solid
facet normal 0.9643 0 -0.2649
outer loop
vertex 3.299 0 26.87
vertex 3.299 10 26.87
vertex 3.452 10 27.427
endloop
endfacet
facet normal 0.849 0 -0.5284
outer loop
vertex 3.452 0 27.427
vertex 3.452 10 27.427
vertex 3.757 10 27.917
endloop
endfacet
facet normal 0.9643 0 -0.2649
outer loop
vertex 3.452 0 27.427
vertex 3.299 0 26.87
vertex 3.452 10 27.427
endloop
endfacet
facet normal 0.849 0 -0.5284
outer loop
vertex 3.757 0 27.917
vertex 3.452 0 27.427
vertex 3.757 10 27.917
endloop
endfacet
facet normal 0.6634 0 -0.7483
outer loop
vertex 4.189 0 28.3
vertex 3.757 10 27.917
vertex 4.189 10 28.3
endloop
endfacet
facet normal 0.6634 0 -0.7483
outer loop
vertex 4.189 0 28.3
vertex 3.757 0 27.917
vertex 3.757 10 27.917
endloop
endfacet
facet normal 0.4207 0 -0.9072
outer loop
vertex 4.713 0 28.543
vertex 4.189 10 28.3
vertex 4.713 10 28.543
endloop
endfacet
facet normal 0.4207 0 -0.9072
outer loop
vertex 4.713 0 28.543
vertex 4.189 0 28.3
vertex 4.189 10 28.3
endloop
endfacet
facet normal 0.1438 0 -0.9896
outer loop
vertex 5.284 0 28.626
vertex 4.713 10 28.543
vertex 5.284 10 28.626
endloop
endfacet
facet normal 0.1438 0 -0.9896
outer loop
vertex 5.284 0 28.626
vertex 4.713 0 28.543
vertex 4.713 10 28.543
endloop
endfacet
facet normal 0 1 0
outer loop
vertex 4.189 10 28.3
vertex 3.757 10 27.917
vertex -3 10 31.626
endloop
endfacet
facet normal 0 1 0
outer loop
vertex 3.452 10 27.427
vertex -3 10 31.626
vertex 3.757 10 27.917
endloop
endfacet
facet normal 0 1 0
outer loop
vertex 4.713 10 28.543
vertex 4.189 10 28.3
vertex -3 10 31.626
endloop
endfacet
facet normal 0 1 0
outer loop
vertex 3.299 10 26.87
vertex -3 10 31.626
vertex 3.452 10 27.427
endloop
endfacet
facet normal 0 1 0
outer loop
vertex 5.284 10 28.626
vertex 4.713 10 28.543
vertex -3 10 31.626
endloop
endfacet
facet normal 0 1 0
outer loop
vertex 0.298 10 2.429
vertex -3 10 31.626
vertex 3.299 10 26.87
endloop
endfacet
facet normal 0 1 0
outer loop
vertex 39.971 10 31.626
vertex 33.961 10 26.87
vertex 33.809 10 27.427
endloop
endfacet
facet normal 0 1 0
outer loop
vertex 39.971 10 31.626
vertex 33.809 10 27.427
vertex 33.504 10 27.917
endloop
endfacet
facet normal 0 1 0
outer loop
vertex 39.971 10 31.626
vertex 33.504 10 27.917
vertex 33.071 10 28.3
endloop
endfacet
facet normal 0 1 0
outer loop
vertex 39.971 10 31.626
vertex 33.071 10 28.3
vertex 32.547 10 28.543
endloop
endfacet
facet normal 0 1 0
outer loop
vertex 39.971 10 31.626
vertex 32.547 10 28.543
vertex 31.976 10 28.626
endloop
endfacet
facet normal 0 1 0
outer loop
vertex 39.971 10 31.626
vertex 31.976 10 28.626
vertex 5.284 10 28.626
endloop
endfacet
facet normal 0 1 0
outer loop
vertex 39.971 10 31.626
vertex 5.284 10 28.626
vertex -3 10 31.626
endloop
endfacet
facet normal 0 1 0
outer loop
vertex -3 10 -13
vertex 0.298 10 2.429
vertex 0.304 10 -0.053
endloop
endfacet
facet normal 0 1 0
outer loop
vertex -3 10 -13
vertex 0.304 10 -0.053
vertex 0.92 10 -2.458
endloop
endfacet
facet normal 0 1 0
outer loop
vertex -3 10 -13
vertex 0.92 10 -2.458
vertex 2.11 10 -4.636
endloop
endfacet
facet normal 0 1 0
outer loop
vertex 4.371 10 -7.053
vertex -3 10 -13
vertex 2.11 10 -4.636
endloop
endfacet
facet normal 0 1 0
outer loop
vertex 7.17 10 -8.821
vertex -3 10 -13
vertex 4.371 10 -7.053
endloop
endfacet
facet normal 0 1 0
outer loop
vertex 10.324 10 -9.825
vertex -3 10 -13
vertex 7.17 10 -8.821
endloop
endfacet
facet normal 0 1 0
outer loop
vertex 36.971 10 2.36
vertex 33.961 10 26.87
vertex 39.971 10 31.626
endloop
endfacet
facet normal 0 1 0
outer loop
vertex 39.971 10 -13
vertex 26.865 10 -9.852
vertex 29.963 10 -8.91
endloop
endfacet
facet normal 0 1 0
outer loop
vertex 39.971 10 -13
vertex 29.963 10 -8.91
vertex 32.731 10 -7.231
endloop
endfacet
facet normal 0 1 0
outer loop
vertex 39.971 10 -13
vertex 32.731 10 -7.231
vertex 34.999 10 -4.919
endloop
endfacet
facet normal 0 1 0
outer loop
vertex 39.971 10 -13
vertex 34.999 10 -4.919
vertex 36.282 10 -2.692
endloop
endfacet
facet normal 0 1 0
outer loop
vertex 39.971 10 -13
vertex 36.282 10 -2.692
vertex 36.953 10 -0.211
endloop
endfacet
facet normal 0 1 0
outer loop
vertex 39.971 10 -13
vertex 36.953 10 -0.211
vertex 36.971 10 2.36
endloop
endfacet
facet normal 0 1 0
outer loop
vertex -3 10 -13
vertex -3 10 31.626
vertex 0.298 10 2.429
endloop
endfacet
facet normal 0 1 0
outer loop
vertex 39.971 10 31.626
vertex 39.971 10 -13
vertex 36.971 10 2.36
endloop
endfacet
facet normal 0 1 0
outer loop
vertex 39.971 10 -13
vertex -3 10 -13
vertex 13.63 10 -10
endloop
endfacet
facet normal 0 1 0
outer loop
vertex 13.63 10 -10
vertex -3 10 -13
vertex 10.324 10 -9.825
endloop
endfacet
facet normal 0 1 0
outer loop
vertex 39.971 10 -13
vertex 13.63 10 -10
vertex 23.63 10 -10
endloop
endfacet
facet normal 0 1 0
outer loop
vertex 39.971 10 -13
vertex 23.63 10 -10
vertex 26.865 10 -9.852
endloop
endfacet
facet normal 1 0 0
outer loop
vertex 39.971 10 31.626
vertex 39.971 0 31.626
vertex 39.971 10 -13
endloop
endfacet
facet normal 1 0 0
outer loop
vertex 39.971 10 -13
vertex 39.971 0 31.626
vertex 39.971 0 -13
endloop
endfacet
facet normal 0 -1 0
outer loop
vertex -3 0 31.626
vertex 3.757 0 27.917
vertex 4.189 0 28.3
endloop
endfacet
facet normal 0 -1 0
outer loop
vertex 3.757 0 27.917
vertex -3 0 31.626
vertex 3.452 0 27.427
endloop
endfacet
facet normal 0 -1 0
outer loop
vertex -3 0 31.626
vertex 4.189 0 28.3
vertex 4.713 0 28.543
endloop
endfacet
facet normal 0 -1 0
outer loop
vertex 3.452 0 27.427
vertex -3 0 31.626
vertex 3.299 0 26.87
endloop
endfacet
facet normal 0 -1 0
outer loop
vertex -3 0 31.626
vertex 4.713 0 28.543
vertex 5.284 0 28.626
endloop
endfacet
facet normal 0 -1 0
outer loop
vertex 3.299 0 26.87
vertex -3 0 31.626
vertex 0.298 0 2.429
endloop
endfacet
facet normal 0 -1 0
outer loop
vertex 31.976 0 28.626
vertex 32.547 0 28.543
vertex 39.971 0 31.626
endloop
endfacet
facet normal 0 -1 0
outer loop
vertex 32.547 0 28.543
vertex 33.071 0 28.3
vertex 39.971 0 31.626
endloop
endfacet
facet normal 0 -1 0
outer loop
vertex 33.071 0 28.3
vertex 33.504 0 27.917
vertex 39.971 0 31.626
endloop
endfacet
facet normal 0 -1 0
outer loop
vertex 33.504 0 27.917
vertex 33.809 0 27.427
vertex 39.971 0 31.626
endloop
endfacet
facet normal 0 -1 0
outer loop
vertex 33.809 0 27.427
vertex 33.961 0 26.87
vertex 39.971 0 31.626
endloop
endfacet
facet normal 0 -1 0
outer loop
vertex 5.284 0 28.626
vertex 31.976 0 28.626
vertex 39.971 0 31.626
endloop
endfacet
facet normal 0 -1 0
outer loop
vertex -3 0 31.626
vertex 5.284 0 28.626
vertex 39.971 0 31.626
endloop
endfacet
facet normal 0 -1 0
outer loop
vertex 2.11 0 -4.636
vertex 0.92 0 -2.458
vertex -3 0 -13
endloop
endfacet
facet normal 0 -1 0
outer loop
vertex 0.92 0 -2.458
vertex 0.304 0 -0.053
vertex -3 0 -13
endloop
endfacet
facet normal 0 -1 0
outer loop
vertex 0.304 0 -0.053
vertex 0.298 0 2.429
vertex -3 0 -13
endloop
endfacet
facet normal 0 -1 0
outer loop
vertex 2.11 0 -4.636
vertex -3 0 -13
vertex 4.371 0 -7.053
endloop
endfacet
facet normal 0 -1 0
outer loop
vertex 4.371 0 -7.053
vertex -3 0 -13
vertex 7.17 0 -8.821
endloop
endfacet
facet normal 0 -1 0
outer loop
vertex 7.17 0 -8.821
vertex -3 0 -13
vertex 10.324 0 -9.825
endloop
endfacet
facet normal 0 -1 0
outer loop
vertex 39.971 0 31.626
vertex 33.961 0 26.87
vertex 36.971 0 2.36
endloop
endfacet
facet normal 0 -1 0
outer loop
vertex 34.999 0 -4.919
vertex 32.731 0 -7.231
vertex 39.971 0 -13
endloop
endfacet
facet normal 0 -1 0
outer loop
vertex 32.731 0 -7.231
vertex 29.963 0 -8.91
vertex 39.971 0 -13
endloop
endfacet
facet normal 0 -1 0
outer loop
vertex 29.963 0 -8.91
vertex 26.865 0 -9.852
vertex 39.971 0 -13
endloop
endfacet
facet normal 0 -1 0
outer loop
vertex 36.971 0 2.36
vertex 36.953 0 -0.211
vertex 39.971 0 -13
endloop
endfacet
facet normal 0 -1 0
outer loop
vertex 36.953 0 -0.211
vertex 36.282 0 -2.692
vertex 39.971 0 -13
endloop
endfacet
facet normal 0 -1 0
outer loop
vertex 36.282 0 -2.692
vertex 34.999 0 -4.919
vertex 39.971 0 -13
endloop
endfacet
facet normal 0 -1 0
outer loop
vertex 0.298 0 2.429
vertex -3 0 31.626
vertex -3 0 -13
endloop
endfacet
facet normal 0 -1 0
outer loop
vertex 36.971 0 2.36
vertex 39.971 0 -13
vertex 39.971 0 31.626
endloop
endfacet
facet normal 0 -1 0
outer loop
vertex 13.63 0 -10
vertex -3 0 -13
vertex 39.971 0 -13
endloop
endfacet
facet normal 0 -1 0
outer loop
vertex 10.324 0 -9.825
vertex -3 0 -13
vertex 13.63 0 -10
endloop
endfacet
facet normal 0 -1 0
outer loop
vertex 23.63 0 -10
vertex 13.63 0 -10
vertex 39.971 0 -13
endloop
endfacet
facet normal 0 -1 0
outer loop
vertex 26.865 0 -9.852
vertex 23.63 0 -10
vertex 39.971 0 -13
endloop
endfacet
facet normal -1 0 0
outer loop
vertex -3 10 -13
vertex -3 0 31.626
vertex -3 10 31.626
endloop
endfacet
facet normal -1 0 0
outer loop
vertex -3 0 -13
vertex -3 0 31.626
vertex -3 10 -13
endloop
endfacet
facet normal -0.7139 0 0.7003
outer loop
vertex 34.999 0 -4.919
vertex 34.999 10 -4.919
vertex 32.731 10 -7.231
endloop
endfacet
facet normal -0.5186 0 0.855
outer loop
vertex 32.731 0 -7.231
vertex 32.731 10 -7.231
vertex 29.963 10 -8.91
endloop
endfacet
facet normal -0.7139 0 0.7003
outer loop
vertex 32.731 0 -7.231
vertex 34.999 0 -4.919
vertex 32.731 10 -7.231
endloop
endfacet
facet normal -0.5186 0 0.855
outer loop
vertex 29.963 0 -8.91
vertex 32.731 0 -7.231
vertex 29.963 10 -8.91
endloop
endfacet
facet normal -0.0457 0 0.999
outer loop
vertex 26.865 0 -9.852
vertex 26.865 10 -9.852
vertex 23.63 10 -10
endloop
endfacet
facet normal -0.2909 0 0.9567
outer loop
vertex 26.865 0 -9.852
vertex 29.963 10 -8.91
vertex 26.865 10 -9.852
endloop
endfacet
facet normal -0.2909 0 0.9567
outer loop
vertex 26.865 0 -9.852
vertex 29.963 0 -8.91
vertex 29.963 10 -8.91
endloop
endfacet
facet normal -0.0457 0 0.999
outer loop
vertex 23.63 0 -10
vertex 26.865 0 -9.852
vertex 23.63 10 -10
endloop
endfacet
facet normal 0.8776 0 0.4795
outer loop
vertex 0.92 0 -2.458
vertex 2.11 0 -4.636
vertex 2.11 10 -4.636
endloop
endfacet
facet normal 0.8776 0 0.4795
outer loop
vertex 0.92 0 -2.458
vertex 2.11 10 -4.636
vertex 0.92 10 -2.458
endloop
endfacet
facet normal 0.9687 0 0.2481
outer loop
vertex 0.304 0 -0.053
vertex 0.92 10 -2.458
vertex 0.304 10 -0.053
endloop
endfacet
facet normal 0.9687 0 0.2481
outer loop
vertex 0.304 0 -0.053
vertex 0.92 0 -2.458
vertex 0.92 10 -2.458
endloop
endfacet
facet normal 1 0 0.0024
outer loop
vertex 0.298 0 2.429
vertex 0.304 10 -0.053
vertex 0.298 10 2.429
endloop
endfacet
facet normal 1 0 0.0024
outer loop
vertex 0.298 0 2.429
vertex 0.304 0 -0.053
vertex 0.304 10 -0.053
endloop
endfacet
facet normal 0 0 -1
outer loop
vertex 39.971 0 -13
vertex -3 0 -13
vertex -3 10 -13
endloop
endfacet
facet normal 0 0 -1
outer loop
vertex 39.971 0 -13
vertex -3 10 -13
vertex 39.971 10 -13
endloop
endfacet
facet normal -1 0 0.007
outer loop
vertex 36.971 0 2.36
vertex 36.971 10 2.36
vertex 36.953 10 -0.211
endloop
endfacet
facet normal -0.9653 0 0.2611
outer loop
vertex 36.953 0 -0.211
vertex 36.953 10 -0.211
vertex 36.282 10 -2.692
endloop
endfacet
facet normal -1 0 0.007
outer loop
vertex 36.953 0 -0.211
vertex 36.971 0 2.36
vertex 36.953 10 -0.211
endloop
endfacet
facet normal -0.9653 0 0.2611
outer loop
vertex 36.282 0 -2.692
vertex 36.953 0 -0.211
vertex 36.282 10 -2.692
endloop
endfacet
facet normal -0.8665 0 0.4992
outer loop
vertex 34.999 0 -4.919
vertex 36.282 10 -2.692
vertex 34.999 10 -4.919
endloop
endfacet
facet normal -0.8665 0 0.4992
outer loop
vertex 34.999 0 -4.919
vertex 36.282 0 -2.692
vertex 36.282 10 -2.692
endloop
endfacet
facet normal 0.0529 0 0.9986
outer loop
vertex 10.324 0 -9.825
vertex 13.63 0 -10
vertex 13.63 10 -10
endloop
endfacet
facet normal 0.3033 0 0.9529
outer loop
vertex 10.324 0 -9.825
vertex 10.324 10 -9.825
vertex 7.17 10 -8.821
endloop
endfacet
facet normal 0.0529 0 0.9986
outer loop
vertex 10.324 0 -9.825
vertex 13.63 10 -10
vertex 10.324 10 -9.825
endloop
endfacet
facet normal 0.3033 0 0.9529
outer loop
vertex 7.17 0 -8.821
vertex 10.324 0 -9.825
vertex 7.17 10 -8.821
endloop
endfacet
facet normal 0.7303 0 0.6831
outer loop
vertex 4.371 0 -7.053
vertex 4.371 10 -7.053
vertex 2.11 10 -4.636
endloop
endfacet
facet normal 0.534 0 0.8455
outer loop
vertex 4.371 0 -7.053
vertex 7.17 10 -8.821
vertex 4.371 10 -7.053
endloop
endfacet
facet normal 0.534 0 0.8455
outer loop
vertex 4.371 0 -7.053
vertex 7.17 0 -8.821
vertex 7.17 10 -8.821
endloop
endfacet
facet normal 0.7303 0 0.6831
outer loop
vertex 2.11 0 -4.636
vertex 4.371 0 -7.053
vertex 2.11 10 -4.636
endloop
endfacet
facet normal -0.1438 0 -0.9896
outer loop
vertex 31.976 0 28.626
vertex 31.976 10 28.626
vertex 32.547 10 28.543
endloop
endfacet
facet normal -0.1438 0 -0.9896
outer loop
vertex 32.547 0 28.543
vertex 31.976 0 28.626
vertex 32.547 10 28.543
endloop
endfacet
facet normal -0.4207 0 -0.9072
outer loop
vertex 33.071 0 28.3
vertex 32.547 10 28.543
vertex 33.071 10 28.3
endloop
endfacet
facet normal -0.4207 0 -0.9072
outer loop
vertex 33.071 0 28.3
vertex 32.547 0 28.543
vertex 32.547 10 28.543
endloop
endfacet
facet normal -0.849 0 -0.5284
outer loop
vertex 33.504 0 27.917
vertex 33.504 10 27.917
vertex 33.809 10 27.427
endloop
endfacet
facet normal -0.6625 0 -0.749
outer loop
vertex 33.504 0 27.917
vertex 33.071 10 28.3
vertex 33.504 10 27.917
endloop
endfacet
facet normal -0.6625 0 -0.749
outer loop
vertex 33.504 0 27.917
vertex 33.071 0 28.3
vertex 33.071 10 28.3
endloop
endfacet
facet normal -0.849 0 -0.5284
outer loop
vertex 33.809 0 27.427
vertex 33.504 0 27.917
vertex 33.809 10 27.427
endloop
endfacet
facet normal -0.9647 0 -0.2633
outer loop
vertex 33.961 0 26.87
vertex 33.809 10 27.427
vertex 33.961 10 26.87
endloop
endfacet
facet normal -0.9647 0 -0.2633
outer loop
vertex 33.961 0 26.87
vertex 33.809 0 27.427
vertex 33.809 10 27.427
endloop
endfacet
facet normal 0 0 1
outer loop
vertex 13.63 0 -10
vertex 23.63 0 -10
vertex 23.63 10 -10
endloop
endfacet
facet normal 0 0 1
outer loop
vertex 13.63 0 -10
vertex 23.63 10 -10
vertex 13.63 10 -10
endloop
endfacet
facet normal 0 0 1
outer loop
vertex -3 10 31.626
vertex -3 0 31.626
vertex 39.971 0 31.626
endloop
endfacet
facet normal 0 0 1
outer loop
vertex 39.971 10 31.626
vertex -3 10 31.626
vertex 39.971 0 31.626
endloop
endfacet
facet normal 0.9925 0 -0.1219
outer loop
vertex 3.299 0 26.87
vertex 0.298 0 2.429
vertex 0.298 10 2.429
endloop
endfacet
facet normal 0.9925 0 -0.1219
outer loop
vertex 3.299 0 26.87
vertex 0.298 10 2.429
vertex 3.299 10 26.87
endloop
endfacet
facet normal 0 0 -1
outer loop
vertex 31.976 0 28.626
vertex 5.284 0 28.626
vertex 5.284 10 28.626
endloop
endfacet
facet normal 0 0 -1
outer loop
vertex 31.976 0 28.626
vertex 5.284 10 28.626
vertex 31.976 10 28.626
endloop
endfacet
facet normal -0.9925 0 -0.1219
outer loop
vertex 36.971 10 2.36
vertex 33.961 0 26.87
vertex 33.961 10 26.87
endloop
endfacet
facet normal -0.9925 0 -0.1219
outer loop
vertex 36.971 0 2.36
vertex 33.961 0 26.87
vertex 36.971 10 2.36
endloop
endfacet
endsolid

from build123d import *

# Parameters (mm, degrees)
BOSS_EXTRUDE1_DEPTH     = 2133.6
SKETCH2_W               = 42.970576624
SKETCH2_H               = 44.626294369
BOSS_EXTRUDE2_DEPTH     = 10
CUT_EXTRUDE1_DEPTH      = 2134.6
CUT_EXTRUDE1_DEPTH_BACK = 1


with BuildPart() as part:
    # Sketch1 → Boss-Extrude1 (new body)
    with BuildSketch(Plane(origin=(0, 0, 0), x_dir=(1, 0, 0), z_dir=(0, 1, 0))):
        with BuildLine():
            Line((13.630161568, 10), (23.630161568, 10))
            ThreePointArc((23.630161568, 10), (29.962715696, 8.909575546), (34.999417241, 4.919349386))
            ThreePointArc((34.999417241, 4.919349386), (36.697471107, 1.472711464), (36.970576624, -2.359795976))
            Line((36.970576624, -2.359795976), (33.961097926, -26.870033055))
            ThreePointArc((33.961097926, -26.870033055), (33.301245719, -28.12420581), (31.976005623, -28.626294369))
            Line((31.976005623, -28.626294369), (5.284317513, -28.626294369))
            ThreePointArc((5.284317513, -28.626294369), (3.959077417, -28.12420581), (3.29922521, -26.870033055))
            Line((3.29922521, -26.870033055), (0.298191514, -2.428574989))
            ThreePointArc((0.298191514, -2.428574989), (0.53721959, 1.274672171), (2.110183266, 4.635767116))
            ThreePointArc((2.110183266, 4.635767116), (7.170061398, 8.821409583), (13.630161568, 10))
        make_face()
    extrude(amount=BOSS_EXTRUDE1_DEPTH)

    # Sketch2 → Boss-Extrude2 (add)
    with BuildSketch(Plane(origin=(0, 0, 0), x_dir=(1, 0, 0), z_dir=(0, 1, 0))):
        with Locations((18.485288312, -9.313147185)):
            Rectangle(SKETCH2_W, SKETCH2_H)
    extrude(amount=BOSS_EXTRUDE2_DEPTH)

    # Sketch3 → Cut-Extrude1 (cut, two sides)
    with BuildSketch(Plane(origin=(0, 0, 0), x_dir=(1, 0, 0), z_dir=(0, 1, 0))) as cut_extrude1_sk:
        with BuildLine():
            Line((0.298191514, -2.428574989), (3.29922521, -26.870033055))
            ThreePointArc((3.29922521, -26.870033055), (3.959077417, -28.12420581), (5.284317513, -28.626294369))
            Line((5.284317513, -28.626294369), (31.976005623, -28.626294369))
            ThreePointArc((31.976005623, -28.626294369), (33.301245719, -28.12420581), (33.961097926, -26.870033055))
            Line((33.961097926, -26.870033055), (36.970576624, -2.359795976))
            ThreePointArc((36.970576624, -2.359795976), (36.697471107, 1.472711464), (34.999417241, 4.919349386))
            ThreePointArc((34.999417241, 4.919349386), (29.962715696, 8.909575546), (23.630161568, 10))
            Line((23.630161568, 10), (13.630161568, 10))
            ThreePointArc((13.630161568, 10), (7.170061398, 8.821409583), (2.110183266, 4.635767116))
            ThreePointArc((2.110183266, 4.635767116), (0.53721959, 1.274672171), (0.298191514, -2.428574989))
        make_face()
    extrude(amount=CUT_EXTRUDE1_DEPTH, mode=Mode.SUBTRACT)
    extrude(cut_extrude1_sk.sketch, amount=-CUT_EXTRUDE1_DEPTH_BACK, mode=Mode.SUBTRACT)


solid = part.part
